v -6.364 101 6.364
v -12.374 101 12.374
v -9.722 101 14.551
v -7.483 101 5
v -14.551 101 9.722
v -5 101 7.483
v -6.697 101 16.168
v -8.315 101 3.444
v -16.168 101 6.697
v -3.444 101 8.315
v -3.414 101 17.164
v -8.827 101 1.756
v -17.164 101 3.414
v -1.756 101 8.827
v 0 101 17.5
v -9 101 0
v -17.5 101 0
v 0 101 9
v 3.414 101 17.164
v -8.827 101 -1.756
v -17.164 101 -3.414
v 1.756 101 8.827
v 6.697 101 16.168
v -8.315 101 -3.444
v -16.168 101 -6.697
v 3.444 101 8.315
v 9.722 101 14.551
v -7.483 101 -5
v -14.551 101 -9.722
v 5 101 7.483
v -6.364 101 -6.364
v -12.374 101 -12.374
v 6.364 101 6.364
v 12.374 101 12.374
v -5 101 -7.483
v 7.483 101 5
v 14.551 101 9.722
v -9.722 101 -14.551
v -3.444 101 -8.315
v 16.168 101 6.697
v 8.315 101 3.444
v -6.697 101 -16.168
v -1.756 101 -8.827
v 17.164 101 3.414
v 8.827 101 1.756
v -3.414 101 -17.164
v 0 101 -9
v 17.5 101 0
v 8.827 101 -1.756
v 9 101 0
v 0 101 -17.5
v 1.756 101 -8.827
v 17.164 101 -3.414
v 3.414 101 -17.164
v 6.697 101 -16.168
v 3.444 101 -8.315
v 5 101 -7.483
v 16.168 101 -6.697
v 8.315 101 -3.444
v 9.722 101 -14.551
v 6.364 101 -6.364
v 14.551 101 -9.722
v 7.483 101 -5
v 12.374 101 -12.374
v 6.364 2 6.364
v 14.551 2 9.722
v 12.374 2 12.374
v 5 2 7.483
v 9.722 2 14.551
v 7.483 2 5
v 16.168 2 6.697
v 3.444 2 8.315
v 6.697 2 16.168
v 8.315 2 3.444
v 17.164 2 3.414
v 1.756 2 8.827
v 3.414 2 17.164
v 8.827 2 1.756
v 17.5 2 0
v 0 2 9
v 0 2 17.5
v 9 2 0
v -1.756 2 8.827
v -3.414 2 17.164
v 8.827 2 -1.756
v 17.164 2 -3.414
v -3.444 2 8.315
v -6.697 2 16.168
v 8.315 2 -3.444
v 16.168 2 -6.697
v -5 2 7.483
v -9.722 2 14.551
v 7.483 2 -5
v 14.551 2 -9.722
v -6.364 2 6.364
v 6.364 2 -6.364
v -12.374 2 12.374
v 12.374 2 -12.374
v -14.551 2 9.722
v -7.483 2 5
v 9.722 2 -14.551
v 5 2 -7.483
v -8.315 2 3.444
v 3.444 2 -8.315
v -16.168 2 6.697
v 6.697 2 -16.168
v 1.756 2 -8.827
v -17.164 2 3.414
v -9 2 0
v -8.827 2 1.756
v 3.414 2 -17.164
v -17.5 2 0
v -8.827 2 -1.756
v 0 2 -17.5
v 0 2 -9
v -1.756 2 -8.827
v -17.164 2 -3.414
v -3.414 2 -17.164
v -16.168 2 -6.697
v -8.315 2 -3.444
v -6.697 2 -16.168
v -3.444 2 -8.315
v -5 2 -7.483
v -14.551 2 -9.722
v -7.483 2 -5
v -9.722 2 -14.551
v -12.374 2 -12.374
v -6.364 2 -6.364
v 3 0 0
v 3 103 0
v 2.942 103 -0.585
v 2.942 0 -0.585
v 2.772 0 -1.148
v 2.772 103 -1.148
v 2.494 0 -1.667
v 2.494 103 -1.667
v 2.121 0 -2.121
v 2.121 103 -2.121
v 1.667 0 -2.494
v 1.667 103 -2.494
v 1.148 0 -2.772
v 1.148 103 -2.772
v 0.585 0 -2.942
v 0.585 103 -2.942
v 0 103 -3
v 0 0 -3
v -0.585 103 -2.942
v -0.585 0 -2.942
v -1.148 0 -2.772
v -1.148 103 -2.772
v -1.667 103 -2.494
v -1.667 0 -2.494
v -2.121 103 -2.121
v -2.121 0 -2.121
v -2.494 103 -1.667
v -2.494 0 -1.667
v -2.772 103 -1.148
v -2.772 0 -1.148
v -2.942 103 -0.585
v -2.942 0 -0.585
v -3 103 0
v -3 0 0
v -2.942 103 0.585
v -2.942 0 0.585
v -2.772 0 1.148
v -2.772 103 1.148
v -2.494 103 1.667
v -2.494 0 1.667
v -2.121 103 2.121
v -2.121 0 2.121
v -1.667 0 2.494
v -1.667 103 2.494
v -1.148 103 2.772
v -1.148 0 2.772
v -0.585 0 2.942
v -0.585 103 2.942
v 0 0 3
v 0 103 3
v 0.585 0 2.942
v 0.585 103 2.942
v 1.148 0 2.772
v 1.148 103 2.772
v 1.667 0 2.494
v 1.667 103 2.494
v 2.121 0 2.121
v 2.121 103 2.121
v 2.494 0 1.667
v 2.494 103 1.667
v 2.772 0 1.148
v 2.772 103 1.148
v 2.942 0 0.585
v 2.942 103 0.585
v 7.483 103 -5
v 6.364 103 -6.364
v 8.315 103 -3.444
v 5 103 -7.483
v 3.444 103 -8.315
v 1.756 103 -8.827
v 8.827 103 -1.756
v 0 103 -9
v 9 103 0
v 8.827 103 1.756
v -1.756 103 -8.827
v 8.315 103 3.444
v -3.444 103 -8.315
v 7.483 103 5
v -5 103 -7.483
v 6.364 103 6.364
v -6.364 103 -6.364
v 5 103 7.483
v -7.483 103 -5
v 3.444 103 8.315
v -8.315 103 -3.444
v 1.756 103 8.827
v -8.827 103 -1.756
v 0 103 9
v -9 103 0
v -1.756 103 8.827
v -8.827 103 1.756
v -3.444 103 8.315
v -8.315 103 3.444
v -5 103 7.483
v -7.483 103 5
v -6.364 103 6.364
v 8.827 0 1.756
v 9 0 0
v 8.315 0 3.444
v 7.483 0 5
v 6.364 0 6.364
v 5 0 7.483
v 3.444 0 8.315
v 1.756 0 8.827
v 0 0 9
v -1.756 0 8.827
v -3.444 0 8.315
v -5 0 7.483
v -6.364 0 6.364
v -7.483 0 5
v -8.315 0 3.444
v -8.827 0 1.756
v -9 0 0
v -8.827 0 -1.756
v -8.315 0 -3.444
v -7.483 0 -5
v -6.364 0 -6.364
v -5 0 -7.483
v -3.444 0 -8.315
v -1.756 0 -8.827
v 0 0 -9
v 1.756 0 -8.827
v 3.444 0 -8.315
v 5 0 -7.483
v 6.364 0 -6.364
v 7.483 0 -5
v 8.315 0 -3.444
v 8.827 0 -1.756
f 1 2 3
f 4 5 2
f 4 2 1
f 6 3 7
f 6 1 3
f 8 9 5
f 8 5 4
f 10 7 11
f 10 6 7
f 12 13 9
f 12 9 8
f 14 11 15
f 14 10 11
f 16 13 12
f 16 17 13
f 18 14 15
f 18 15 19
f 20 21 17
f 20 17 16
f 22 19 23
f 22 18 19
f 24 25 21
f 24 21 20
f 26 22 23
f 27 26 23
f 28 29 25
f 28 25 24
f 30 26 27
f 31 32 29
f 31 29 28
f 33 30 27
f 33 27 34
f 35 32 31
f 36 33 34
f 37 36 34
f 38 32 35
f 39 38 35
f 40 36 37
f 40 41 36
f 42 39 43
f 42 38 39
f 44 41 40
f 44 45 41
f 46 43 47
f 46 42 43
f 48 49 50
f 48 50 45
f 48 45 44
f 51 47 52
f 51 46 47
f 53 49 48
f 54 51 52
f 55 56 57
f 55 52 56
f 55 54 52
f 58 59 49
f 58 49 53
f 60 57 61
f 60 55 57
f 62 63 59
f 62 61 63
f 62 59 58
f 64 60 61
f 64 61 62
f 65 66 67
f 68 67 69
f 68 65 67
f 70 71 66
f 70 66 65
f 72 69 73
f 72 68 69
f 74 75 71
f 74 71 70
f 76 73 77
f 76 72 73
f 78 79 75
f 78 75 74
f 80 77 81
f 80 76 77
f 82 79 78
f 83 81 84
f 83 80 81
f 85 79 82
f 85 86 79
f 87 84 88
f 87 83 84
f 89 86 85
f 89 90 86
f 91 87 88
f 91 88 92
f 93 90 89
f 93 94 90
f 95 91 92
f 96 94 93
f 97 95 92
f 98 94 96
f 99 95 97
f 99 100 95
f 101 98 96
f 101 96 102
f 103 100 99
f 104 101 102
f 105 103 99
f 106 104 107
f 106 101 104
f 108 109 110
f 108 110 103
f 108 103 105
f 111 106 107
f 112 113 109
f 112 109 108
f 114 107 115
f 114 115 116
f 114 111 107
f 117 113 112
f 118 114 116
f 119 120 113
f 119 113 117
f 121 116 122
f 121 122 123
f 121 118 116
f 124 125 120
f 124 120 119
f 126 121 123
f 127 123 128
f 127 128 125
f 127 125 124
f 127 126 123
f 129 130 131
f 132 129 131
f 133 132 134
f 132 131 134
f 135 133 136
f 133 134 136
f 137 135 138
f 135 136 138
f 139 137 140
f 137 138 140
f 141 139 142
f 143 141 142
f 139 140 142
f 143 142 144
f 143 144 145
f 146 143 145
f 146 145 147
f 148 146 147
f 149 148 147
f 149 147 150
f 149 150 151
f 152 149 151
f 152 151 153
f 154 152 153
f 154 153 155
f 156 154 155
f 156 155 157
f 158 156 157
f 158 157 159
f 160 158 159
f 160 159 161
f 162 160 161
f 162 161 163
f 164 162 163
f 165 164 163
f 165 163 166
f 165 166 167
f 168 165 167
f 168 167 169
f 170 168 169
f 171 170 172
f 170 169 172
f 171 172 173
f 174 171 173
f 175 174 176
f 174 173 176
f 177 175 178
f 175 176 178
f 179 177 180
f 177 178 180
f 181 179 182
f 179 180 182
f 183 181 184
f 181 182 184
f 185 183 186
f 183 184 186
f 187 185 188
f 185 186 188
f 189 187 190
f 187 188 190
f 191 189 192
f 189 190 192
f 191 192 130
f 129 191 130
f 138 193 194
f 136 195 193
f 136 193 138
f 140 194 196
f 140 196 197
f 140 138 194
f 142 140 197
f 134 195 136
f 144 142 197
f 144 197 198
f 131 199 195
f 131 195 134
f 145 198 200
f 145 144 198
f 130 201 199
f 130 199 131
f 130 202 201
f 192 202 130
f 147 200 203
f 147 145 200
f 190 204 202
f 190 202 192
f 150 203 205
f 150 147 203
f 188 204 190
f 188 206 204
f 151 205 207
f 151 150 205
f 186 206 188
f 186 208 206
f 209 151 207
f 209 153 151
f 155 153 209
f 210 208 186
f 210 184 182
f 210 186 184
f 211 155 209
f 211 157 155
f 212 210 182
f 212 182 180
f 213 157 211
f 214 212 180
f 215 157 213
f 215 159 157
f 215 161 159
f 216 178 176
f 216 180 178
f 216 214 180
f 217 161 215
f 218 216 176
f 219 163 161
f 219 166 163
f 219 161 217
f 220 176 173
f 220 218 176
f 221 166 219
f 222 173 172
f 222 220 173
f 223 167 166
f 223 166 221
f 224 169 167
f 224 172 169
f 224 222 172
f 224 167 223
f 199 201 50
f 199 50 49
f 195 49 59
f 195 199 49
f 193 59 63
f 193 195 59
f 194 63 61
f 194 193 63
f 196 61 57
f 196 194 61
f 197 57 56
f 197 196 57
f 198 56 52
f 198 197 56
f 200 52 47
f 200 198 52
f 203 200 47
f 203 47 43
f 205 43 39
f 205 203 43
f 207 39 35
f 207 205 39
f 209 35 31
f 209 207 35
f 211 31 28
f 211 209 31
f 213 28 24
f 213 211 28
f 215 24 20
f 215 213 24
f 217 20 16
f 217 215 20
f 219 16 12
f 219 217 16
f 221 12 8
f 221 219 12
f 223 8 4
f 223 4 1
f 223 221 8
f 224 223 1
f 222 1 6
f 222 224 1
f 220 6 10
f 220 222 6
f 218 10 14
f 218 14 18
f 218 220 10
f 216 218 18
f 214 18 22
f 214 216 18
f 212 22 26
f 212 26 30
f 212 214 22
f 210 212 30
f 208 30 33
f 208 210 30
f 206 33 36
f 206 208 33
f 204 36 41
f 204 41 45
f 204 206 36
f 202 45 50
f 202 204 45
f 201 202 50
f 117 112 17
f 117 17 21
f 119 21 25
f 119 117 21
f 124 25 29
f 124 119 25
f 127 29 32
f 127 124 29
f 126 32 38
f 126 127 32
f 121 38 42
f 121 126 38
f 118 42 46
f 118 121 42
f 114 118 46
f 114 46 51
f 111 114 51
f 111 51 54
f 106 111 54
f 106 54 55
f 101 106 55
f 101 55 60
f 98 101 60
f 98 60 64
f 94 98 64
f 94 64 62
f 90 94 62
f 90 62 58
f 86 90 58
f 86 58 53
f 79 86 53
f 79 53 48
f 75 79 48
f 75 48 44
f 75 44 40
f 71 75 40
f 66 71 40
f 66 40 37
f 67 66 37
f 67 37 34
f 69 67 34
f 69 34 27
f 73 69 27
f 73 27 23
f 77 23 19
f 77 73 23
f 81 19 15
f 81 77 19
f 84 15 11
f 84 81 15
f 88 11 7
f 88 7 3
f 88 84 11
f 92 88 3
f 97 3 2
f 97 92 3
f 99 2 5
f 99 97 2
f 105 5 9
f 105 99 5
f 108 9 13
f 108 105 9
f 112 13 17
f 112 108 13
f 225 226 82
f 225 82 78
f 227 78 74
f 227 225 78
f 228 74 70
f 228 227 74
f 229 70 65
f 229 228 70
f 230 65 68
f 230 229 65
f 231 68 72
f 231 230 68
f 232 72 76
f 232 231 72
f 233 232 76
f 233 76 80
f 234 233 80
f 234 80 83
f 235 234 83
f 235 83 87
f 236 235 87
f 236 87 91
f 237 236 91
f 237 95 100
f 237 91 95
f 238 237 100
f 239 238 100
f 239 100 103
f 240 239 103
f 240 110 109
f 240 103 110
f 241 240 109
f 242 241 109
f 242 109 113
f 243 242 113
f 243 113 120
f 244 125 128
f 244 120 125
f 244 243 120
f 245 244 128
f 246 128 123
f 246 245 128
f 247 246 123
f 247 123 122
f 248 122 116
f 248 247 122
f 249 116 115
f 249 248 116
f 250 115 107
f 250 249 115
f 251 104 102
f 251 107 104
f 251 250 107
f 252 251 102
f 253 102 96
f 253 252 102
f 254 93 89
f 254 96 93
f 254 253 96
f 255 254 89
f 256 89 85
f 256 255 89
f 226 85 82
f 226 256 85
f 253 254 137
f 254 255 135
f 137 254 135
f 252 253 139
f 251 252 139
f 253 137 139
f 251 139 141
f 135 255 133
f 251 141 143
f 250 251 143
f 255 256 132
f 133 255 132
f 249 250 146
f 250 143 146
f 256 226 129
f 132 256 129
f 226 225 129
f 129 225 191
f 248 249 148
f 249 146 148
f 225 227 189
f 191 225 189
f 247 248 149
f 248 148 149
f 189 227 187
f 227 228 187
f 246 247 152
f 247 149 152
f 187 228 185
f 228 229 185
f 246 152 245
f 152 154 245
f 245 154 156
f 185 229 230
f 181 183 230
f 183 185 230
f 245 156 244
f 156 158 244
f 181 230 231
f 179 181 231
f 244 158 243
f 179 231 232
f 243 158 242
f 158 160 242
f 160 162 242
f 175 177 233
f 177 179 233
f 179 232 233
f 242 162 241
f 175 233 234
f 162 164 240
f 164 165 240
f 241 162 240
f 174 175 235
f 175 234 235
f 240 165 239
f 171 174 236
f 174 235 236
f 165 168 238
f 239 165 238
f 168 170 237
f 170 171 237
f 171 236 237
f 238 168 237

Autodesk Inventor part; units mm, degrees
ref_plane "YZ Plane" through (0, 0, 0) normal (1, 0, 0) x (0, 1, 0)
ref_plane "XZ Plane" through (0, 0, 0) normal (0, 1, 0) x (-1, 0, 0)
sketch "Sketch1" plane through (0, 0, 0) normal (0, 1, 0) x (-1, 0, 0)
  circle A0 centre (0, 0) radius 17.5
  dimension "d0" = 35
extrude "Extrusion1" add sketch "Sketch1" along normal blind 103
sketch "Sketch2" plane through (0, 103, 0) normal (0, 1, 0) x (1, 0, 0)
  circle A0 centre (0, 0) radius 3
  circle A1 centre (0, 0) radius 9
  circle A2 centre (0, 0) radius 17.5
  dimension "d3" = 6
  dimension "d4" = 18
extrude "Extrusion2" cut sketch "Sketch2" against normal blind 2 contours A2
extrude "Extrusion3" cut sketch "Sketch2" against normal through all contours A0
ref_plane "Work Plane1" through (0, 51.5, 0) normal (0, 1, 0) x (1, 0, 0)
mirror "Mirror1" about plane through (0, 51.5, 0) normal (0, 1, 0) of "Extrusion2"
properties part number "roller"
